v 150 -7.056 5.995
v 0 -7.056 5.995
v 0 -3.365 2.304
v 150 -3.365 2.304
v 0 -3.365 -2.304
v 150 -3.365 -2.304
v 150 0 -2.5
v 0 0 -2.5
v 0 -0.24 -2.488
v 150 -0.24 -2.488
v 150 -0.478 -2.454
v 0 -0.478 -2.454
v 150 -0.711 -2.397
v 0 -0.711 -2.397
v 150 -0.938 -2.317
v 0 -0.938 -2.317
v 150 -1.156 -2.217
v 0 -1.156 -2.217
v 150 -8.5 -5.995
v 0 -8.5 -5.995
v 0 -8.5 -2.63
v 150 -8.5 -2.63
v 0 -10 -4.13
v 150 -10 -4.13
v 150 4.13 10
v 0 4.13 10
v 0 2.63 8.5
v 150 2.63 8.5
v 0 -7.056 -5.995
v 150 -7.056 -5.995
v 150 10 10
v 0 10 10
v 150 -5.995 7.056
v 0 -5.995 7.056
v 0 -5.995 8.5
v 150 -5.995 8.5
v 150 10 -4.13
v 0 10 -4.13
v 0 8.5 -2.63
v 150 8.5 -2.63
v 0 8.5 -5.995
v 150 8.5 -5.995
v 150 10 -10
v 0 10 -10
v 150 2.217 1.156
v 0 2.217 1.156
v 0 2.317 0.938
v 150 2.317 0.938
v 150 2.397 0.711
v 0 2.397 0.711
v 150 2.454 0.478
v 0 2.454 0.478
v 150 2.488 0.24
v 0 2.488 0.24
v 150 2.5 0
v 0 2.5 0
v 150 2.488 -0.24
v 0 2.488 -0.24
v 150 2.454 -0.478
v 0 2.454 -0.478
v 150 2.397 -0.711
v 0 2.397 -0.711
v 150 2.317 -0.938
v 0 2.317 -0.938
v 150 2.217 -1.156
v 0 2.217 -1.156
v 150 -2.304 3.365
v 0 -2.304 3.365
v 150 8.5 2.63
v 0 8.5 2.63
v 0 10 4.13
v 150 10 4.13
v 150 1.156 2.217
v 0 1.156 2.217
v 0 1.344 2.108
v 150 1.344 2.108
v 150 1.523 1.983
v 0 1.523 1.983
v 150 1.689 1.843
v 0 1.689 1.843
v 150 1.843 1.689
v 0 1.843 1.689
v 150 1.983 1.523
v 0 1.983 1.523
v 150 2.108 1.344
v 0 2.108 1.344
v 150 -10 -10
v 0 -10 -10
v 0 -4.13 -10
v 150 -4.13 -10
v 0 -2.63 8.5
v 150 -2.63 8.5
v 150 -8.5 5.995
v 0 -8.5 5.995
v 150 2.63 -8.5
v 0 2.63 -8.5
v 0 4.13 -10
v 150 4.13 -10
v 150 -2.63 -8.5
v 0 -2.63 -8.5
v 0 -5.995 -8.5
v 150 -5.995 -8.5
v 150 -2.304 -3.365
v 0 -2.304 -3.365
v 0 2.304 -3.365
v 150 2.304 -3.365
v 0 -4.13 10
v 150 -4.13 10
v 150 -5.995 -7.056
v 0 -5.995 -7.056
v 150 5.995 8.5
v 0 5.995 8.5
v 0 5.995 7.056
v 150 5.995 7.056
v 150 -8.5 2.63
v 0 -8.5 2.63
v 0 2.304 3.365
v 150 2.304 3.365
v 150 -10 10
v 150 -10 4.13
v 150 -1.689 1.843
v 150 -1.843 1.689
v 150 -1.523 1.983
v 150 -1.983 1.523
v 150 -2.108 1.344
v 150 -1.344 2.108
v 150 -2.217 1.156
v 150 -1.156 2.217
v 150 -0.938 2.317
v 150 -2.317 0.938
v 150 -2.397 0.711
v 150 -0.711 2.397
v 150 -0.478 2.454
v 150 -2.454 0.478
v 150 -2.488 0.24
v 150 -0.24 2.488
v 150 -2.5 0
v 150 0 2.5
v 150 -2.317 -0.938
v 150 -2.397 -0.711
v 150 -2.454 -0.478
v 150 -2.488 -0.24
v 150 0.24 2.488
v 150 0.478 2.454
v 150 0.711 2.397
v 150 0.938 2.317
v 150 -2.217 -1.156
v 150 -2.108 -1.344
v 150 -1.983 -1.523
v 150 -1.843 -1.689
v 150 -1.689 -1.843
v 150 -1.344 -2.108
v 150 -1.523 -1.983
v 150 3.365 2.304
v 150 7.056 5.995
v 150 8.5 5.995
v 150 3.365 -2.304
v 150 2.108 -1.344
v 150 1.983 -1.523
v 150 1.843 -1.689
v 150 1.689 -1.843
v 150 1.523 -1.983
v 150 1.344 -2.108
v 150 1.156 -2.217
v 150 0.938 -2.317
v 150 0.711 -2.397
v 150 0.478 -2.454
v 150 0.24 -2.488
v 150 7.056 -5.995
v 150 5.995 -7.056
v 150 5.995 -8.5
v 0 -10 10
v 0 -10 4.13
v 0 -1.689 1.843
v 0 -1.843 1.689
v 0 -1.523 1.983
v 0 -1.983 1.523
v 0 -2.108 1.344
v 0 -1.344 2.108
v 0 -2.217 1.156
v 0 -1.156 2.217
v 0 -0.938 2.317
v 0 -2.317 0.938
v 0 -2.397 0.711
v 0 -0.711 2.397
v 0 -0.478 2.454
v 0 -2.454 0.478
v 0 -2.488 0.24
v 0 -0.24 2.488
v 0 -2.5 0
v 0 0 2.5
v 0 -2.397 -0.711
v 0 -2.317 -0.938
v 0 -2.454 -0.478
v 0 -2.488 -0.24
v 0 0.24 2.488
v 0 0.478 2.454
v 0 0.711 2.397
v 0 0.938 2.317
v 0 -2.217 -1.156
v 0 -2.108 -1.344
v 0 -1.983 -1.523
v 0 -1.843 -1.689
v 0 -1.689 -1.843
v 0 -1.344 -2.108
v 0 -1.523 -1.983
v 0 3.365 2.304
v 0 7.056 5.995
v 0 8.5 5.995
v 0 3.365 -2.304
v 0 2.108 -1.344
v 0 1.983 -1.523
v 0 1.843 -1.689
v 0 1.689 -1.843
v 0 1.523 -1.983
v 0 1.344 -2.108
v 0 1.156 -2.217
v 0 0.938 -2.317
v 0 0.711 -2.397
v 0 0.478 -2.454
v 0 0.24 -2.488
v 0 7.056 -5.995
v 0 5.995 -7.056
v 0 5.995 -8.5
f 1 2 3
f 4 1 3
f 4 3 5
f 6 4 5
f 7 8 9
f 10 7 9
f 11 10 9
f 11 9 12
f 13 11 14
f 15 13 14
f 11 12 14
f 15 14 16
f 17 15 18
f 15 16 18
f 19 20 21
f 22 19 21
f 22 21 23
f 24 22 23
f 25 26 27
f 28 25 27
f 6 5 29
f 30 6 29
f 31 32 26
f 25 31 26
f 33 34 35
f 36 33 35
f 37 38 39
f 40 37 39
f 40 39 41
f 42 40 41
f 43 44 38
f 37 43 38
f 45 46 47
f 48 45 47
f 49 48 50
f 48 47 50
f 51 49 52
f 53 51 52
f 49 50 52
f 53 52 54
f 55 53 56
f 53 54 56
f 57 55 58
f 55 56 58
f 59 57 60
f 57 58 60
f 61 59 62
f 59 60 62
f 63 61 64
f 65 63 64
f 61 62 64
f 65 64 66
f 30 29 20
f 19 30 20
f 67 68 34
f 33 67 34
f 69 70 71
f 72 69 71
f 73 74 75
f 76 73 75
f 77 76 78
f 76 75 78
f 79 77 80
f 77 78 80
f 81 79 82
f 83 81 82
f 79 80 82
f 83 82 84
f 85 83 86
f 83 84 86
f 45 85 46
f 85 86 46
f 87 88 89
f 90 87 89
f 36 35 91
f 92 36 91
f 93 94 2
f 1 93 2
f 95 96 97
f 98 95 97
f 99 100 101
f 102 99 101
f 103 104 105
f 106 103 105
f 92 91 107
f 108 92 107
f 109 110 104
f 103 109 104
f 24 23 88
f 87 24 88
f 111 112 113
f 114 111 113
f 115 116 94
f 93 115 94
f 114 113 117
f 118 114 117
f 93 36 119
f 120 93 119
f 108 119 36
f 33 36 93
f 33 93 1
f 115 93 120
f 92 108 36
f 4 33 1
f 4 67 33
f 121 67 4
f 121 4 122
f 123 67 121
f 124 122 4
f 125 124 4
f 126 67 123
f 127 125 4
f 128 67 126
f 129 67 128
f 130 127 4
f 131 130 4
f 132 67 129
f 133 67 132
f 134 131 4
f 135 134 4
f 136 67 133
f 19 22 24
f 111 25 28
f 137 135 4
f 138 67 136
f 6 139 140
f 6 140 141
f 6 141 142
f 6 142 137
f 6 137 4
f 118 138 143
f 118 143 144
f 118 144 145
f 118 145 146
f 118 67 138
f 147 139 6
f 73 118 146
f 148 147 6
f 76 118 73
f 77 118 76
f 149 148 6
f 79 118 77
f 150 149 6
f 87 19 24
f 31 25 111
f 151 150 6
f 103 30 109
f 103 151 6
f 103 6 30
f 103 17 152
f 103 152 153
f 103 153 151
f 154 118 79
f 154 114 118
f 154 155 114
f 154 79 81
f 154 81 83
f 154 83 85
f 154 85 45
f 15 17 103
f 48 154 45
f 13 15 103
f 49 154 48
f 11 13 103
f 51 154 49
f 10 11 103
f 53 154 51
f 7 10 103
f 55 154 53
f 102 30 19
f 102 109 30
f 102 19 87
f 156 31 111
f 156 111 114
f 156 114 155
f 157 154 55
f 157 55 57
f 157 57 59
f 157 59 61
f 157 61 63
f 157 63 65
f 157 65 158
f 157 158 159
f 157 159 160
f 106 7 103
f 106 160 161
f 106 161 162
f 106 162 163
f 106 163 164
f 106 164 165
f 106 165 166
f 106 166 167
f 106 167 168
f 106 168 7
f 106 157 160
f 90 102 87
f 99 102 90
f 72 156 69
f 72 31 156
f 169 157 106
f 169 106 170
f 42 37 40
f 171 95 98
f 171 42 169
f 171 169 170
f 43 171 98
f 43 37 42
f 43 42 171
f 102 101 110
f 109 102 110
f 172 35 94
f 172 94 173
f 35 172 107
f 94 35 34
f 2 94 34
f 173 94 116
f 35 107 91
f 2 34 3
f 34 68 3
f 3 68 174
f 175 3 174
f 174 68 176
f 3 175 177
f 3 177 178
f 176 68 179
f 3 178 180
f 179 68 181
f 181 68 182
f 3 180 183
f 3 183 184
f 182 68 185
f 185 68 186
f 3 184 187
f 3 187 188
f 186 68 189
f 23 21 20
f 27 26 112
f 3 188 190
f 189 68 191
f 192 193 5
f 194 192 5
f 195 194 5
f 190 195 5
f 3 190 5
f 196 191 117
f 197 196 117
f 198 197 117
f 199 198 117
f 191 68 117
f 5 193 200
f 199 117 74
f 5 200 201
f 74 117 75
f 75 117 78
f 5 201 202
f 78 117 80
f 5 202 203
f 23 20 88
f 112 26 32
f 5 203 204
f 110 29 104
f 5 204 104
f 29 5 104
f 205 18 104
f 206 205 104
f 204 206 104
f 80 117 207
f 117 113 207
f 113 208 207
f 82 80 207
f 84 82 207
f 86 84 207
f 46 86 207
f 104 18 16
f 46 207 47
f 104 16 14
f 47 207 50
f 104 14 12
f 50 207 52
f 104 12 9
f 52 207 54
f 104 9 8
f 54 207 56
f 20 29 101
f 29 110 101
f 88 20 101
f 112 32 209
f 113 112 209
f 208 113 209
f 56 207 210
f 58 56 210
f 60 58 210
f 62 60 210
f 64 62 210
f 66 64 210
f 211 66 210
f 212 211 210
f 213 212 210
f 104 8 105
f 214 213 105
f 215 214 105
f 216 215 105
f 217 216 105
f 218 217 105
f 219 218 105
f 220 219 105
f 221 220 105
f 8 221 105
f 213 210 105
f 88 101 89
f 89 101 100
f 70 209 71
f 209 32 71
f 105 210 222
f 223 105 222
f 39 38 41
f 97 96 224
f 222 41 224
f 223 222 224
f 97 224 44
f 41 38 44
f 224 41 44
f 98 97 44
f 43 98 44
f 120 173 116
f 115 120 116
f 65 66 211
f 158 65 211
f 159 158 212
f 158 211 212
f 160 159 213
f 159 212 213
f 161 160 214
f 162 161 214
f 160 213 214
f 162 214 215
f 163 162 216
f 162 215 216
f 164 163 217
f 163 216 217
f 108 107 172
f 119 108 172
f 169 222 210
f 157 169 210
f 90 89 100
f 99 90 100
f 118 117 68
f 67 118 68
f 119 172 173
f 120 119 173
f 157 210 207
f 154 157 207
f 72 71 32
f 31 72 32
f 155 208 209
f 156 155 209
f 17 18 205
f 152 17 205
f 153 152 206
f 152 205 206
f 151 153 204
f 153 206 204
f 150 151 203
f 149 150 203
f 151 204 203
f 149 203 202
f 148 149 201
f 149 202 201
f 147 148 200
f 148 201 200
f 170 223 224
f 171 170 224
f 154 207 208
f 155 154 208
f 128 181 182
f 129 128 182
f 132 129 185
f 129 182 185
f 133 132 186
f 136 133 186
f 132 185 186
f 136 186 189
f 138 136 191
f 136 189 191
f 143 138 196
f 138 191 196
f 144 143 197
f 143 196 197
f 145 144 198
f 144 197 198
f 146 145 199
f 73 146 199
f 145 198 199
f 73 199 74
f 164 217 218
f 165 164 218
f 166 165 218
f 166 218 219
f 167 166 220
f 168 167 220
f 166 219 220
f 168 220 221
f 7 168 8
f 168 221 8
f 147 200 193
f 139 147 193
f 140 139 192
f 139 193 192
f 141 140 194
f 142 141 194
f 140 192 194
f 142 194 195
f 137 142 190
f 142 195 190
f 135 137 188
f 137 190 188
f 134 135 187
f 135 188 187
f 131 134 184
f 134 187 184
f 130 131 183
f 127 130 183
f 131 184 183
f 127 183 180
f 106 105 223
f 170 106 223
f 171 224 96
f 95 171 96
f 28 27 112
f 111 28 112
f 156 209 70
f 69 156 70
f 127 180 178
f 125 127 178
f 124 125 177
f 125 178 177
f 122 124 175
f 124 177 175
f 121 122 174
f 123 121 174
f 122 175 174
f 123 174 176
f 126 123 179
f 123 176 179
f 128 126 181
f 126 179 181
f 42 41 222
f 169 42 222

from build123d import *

# Parameters (mm, degrees)
BOSS_EXTRUDE1_DEPTH = 150


with BuildPart() as part:
    # Sketch1 → Boss-Extrude1 (new body)
    with BuildSketch(Plane(origin=(0, 0, 0), x_dir=(0, 0, -1), z_dir=(1, 0, 0))):
        Polygon((8.939339828, -10), (5.995, -7.055660172), (5.995, -8.5), (2.63, -8.5), (4.13, -10), align=None)
        Polygon((8.5, -5.995), (7.055660172, -5.995), (10, -8.939339828), (10, -4.13), (8.5, -2.63), align=None)
        Polygon((7.055660172, -5.995), (3.365, -2.304339828), (3.365, -3.365), (2.304339828, -3.365), (5.995, -7.055660172), (8.939339828, -10), (10, -10), (10, -8.939339828), align=None)
        with BuildLine():
            Line((3.365, -3.365), (3.365, -2.304339828))
            Line((3.365, -2.304339828), (2.216672281, -1.15601211))
            ThreePointArc((2.216672281, -1.15601211), (1.767766953, -1.767766953), (1.15601211, -2.216672281))
            Line((1.15601211, -2.216672281), (2.304339828, -3.365))
            Line((2.304339828, -3.365), (3.365, -3.365))
        make_face()
        with BuildLine():
            Line((3.365, -2.304339828), (3.365, 2.304339828))
            Line((3.365, 2.304339828), (2.216672281, 1.15601211))
            ThreePointArc((2.216672281, 1.15601211), (2.428135159, 0.595113139), (2.5, 0))
            ThreePointArc((2.5, 0), (2.428135159, -0.595113139), (2.216672281, -1.15601211))
            Line((2.216672281, -1.15601211), (3.365, -2.304339828))
        make_face()
        with BuildLine():
            Line((2.216672281, 1.15601211), (3.365, 2.304339828))
            Line((3.365, 2.304339828), (3.365, 3.365))
            Line((3.365, 3.365), (2.304339828, 3.365))
            Line((2.304339828, 3.365), (1.15601211, 2.216672281))
            ThreePointArc((1.15601211, 2.216672281), (1.767766953, 1.767766953), (2.216672281, 1.15601211))
        make_face()
        with BuildLine():
            ThreePointArc((-1.15601211, 2.216672281), (0, 2.5), (1.15601211, 2.216672281))
            Line((1.15601211, 2.216672281), (2.304339828, 3.365))
            Line((2.304339828, 3.365), (-2.304339828, 3.365))
            Line((-2.304339828, 3.365), (-1.15601211, 2.216672281))
        make_face()
        with BuildLine():
            ThreePointArc((-2.216672281, 1.15601211), (-1.767766953, 1.767766953), (-1.15601211, 2.216672281))
            Line((-1.15601211, 2.216672281), (-2.304339828, 3.365))
            Line((-2.304339828, 3.365), (-3.365, 3.365))
            Line((-3.365, 3.365), (-3.365, 2.304339828))
            Line((-3.365, 2.304339828), (-2.216672281, 1.15601211))
        make_face()
        with BuildLine():
            ThreePointArc((-2.216672281, -1.15601211), (-2.5, 0), (-2.216672281, 1.15601211))
            Line((-2.216672281, 1.15601211), (-3.365, 2.304339828))
            Line((-3.365, 2.304339828), (-3.365, -2.304339828))
            Line((-3.365, -2.304339828), (-2.216672281, -1.15601211))
        make_face()
        with BuildLine():
            Line((-2.304339828, -3.365), (-1.15601211, -2.216672281))
            ThreePointArc((-1.15601211, -2.216672281), (-1.767766953, -1.767766953), (-2.216672281, -1.15601211))
            Line((-2.216672281, -1.15601211), (-3.365, -2.304339828))
            Line((-3.365, -2.304339828), (-3.365, -3.365))
            Line((-3.365, -3.365), (-2.304339828, -3.365))
        make_face()
        with BuildLine():
            Line((-2.304339828, -3.365), (2.304339828, -3.365))
            Line((2.304339828, -3.365), (1.15601211, -2.216672281))
            ThreePointArc((1.15601211, -2.216672281), (0, -2.5), (-1.15601211, -2.216672281))
            Line((-1.15601211, -2.216672281), (-2.304339828, -3.365))
        make_face()
        Polygon((10, 4.13), (10, 8.939339828), (7.055660172, 5.995), (8.5, 5.995), (8.5, 2.63), align=None)
        Polygon((7.055660172, 5.995), (10, 8.939339828), (10, 10), (8.939339828, 10), (5.995, 7.055660172), (2.304339828, 3.365), (3.365, 3.365), (3.365, 2.304339828), align=None)
        Polygon((5.995, 7.055660172), (8.939339828, 10), (4.13, 10), (2.63, 8.5), (5.995, 8.5), align=None)
        Polygon((-8.939339828, 10), (-5.995, 7.055660172), (-5.995, 8.5), (-2.63, 8.5), (-4.13, 10), align=None)
        Polygon((-3.365, 3.365), (-2.304339828, 3.365), (-5.995, 7.055660172), (-8.939339828, 10), (-10, 10), (-10, 8.939339828), (-7.055660172, 5.995), (-3.365, 2.304339828), align=None)
        Polygon((-8.5, 5.995), (-7.055660172, 5.995), (-10, 8.939339828), (-10, 4.13), (-8.5, 2.63), align=None)
        Polygon((-10, -8.939339828), (-7.055660172, -5.995), (-8.5, -5.995), (-8.5, -2.63), (-10, -4.13), align=None)
        Polygon((-5.995, -7.055660172), (-2.304339828, -3.365), (-3.365, -3.365), (-3.365, -2.304339828), (-7.055660172, -5.995), (-10, -8.939339828), (-10, -10), (-8.939339828, -10), align=None)
        Polygon((-5.995, -8.5), (-5.995, -7.055660172), (-8.939339828, -10), (-4.13, -10), (-2.63, -8.5), align=None)
    extrude(amount=BOSS_EXTRUDE1_DEPTH)


solid = part.part
